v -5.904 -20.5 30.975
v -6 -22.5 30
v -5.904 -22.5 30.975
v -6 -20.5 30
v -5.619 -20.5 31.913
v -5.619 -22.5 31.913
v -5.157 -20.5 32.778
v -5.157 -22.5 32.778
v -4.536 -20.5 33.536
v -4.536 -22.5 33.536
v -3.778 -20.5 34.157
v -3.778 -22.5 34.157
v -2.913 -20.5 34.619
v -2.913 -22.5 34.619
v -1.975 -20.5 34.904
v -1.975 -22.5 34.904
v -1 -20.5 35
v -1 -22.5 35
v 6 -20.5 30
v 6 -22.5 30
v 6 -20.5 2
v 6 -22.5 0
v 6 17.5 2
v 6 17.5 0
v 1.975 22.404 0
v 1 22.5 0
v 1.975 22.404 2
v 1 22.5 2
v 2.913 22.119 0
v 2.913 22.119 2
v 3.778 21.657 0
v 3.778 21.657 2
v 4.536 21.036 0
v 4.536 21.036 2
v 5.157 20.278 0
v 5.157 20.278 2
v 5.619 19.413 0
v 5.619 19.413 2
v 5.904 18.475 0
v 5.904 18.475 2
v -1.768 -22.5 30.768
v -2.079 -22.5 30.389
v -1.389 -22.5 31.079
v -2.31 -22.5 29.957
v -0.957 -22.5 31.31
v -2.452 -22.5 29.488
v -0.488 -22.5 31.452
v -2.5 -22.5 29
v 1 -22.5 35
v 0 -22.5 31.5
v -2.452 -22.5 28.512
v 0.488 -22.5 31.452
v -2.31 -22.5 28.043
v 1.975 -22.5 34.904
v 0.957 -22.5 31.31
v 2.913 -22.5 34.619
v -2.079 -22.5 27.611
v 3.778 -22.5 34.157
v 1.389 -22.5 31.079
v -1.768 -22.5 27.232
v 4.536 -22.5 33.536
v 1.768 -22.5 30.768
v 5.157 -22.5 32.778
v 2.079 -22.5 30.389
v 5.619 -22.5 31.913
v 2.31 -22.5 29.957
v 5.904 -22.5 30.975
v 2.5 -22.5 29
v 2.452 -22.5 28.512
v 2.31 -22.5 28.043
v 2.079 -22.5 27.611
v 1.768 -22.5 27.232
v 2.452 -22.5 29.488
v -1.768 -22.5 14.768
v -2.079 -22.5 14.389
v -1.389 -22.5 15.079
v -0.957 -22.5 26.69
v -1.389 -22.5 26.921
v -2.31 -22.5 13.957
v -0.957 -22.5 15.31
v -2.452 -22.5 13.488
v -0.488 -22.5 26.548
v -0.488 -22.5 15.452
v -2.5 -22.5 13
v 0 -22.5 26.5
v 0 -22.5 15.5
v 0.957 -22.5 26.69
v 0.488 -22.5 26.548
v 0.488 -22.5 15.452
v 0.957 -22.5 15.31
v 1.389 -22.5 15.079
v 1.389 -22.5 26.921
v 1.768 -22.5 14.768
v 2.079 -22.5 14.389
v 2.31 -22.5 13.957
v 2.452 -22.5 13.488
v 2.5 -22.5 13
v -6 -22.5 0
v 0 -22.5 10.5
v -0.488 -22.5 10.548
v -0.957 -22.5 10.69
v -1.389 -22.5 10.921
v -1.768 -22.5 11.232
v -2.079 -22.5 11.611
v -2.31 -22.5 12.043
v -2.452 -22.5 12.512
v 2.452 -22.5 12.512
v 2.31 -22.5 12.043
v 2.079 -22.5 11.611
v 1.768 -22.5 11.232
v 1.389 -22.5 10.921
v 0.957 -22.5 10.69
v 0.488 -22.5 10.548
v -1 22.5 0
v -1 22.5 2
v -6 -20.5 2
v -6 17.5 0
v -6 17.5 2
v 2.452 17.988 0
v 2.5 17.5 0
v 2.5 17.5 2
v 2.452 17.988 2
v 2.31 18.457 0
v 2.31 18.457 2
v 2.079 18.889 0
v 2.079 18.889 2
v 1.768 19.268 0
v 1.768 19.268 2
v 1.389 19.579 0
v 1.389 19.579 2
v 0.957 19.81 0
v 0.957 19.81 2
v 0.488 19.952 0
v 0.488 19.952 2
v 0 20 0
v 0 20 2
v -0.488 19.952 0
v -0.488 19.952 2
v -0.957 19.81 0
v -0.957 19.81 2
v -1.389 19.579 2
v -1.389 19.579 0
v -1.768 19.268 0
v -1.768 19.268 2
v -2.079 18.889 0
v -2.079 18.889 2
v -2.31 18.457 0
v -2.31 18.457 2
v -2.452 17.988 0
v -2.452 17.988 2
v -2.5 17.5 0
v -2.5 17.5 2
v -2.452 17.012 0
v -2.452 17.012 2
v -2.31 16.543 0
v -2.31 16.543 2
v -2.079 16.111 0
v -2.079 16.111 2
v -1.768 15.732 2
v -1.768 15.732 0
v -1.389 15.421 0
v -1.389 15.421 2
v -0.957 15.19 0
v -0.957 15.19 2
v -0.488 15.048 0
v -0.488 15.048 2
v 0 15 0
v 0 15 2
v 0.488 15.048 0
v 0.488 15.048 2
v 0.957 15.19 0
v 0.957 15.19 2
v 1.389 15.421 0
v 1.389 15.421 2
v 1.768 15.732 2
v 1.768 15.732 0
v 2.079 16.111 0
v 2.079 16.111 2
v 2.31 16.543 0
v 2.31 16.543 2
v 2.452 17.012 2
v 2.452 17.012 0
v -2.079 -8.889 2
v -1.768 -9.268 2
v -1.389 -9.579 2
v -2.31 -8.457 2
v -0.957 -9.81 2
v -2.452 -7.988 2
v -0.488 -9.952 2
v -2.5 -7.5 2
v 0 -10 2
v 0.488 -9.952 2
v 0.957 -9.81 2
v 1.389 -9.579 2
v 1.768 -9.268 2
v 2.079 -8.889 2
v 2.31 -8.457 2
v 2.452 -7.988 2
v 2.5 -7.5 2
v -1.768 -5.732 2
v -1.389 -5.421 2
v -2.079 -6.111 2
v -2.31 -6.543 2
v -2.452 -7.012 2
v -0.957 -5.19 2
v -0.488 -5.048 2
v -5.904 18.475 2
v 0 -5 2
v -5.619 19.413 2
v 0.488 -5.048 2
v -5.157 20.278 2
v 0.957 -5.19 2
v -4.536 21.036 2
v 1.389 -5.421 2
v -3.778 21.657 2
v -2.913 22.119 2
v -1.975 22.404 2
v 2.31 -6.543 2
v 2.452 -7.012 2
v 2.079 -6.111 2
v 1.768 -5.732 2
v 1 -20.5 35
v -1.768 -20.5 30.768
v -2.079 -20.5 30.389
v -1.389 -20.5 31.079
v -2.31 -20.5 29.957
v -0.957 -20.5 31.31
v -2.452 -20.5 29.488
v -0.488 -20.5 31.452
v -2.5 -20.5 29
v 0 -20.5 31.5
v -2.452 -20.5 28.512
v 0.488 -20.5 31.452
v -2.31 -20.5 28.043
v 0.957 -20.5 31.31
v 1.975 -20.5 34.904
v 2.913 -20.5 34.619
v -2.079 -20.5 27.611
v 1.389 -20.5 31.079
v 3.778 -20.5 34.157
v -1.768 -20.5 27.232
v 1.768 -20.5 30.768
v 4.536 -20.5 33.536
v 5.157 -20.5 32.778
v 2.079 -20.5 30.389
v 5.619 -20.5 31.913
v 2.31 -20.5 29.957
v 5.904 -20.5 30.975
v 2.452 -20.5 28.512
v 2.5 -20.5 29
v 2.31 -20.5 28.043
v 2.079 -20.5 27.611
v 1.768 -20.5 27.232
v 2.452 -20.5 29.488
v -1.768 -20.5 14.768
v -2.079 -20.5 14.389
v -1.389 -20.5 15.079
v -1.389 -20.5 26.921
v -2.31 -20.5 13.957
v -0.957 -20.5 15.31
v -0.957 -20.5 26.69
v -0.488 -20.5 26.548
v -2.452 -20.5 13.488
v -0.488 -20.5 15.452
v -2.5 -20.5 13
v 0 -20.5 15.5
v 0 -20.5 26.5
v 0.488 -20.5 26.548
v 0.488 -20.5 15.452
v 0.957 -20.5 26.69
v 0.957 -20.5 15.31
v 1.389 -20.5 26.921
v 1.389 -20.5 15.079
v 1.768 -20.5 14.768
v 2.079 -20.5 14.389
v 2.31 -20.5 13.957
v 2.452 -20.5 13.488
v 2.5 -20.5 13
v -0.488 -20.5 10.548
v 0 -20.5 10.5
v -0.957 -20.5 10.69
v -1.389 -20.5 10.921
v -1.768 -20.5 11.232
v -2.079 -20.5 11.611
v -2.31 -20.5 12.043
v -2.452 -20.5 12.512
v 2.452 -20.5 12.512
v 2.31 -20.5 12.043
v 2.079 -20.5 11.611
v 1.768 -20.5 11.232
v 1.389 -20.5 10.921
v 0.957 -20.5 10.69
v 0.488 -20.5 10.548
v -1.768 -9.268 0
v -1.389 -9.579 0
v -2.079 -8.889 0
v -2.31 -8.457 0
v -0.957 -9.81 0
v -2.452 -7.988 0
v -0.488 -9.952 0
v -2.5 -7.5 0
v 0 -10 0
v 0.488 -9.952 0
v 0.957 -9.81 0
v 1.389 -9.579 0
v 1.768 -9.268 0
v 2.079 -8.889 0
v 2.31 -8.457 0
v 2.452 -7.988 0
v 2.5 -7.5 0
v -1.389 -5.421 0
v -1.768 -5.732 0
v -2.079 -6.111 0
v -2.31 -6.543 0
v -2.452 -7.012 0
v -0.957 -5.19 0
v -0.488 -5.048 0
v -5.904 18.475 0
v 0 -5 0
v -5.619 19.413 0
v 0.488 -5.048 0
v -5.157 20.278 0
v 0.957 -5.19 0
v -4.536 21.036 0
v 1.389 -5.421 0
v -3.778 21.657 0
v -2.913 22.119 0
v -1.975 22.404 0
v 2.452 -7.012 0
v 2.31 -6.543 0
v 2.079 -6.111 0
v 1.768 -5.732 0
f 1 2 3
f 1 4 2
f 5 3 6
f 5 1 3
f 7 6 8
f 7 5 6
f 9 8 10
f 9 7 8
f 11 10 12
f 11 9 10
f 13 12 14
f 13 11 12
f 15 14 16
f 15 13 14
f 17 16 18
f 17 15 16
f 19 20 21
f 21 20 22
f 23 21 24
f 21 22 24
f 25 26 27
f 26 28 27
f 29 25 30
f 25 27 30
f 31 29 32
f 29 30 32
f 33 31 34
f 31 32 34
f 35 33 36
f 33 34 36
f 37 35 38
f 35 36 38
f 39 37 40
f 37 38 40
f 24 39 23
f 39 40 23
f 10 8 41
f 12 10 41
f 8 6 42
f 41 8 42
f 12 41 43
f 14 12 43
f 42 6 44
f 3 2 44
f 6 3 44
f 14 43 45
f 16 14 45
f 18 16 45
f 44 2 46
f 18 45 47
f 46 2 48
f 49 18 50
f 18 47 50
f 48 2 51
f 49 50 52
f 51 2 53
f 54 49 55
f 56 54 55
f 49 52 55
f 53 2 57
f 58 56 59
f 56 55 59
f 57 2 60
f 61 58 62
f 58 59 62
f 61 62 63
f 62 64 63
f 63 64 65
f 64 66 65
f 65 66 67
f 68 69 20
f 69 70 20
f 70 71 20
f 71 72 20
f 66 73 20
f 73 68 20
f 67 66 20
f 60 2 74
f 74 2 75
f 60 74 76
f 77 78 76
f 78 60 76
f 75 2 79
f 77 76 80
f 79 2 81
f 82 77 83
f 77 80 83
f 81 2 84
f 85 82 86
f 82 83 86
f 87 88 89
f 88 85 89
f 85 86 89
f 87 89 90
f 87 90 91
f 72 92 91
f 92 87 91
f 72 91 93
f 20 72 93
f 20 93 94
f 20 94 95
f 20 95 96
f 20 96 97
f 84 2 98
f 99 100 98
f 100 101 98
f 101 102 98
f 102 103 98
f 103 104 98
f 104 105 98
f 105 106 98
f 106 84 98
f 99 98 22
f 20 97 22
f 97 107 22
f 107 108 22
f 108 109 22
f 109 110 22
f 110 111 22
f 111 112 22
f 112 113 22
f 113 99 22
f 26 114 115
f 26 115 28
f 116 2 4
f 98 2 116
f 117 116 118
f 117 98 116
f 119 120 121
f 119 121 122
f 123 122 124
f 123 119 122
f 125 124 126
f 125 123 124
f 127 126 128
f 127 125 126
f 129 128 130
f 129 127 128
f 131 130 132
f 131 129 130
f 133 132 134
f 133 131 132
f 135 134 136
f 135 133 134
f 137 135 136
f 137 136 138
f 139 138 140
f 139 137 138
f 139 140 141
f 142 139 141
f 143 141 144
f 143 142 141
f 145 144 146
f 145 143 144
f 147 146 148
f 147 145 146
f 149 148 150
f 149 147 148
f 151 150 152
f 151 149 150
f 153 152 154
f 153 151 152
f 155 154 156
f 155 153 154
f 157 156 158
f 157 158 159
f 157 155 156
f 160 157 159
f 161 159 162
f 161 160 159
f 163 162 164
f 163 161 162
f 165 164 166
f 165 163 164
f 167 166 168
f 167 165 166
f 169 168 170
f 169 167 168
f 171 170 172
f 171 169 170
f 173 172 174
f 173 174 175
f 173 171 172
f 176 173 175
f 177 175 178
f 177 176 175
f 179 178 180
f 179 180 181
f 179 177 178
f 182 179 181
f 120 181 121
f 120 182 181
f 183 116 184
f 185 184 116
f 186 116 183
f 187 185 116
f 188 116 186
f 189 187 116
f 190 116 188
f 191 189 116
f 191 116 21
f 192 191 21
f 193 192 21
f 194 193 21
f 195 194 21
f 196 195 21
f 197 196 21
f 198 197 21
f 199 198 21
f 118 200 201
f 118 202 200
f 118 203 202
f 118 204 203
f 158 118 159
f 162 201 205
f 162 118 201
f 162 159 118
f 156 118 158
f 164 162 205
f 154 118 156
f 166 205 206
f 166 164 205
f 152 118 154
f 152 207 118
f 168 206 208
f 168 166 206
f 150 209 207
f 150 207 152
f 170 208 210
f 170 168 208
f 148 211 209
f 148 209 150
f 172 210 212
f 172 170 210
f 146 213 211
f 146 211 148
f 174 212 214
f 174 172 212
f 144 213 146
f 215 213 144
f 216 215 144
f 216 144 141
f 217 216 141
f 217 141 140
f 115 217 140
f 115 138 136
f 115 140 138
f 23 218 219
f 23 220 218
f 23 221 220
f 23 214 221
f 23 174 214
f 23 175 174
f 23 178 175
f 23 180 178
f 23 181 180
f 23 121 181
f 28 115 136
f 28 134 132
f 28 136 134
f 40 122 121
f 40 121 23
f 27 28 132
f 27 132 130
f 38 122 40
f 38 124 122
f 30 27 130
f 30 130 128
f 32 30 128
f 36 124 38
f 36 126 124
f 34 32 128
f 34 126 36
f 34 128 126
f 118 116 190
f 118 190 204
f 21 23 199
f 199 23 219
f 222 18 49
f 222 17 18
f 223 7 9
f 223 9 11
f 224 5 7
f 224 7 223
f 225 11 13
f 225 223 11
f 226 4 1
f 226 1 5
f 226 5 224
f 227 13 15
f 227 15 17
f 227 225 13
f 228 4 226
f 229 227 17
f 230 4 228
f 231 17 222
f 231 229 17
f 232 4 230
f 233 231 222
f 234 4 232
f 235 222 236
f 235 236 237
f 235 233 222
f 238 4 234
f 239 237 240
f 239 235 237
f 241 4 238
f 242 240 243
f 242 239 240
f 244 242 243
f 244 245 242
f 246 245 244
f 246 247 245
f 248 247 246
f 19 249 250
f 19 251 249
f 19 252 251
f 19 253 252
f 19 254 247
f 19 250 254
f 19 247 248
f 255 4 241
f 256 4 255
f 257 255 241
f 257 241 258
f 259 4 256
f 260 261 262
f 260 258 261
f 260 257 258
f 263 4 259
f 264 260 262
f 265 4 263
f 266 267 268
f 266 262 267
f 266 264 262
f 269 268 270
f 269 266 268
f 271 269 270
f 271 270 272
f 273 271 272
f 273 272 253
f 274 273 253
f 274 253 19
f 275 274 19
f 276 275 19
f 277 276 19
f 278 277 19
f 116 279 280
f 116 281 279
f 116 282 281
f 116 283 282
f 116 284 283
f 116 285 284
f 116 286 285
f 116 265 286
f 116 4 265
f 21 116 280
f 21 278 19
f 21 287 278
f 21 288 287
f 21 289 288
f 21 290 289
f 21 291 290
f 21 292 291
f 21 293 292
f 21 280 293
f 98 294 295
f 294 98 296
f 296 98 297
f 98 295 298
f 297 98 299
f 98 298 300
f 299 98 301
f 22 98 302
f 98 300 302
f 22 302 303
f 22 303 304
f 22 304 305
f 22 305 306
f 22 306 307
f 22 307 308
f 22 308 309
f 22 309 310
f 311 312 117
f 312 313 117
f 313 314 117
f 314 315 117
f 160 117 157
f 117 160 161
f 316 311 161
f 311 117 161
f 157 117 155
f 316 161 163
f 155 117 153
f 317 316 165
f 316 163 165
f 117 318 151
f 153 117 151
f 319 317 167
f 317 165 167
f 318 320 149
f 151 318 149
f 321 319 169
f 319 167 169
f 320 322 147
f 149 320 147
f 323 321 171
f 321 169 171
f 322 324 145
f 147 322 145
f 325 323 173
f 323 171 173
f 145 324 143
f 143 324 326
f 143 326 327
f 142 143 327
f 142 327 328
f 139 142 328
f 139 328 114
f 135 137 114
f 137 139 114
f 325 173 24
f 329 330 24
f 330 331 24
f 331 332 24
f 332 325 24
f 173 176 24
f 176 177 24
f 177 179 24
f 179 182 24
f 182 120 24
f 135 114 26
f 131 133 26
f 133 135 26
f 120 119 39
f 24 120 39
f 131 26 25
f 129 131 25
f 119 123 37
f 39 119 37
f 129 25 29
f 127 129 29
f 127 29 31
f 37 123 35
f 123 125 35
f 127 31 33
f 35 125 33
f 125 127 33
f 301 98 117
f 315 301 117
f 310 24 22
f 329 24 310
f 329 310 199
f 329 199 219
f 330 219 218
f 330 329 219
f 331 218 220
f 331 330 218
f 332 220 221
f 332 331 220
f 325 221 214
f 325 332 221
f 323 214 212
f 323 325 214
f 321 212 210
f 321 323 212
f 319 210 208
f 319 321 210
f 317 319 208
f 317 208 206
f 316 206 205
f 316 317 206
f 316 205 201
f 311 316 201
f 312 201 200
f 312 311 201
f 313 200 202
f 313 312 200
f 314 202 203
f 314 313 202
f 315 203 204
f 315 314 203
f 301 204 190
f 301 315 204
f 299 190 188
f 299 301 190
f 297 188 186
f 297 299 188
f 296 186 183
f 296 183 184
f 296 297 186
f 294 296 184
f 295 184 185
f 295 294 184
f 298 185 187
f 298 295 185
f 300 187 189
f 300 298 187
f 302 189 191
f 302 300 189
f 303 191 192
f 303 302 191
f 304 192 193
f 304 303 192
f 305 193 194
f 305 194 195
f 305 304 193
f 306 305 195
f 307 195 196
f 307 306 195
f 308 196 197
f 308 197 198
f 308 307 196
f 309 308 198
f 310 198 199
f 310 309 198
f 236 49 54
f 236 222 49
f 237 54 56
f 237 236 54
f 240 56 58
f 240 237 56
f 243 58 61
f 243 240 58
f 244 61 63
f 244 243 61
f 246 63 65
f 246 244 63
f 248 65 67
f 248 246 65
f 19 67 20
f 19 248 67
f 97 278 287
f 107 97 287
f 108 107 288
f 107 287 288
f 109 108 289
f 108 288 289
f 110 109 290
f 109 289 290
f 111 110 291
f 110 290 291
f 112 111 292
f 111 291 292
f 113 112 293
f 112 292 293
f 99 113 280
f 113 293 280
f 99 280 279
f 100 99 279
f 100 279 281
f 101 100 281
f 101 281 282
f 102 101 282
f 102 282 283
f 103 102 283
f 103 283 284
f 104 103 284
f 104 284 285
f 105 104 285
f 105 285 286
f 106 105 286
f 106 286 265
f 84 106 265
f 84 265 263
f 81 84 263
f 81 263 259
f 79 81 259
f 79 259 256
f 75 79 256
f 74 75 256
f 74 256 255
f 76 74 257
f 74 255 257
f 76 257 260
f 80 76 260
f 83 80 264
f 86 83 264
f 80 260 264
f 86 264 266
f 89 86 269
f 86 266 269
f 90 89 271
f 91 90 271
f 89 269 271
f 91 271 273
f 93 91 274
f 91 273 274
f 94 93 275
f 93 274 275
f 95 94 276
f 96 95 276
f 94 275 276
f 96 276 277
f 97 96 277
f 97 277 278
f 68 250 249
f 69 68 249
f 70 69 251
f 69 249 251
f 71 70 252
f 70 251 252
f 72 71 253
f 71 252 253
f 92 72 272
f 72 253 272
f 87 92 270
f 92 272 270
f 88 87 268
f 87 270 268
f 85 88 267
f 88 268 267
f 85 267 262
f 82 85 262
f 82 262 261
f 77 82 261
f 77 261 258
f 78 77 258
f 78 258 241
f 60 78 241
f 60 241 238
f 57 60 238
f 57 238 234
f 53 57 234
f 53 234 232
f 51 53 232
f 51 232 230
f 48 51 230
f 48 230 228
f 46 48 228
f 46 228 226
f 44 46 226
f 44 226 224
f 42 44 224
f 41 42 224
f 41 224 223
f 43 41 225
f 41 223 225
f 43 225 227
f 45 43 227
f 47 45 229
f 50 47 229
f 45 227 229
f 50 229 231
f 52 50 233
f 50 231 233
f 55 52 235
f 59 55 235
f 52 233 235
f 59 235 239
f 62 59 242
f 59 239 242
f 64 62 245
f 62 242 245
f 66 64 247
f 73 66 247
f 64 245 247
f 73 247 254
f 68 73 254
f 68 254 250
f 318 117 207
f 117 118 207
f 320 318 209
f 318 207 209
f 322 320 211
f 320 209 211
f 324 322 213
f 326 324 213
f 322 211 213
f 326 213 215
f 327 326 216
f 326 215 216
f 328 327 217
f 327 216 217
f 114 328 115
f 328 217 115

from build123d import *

# Parameters (mm, degrees)
SKETCH1_W           = 12
SKETCH1_H           = 45
SKETCH1_R           = 2.5
BOSS_EXTRUDE1_DEPTH = 2
FILLET3_R           = 5
SKETCH2_W           = 12
SKETCH2_H           = 2
BOSS_EXTRUDE2_DEPTH = 33
SKETCH3_R           = 2.5
CUT_EXTRUDE1_DEPTH  = 33
FILLET4_R           = 5


with BuildPart() as part:
    # Sketch1 → Boss-Extrude1 (new body)
    with BuildSketch(Plane.XY):
        Rectangle(SKETCH1_W, SKETCH1_H)
        with Locations((0, -7.5)):
            Circle(SKETCH1_R, mode=Mode.SUBTRACT)
        with Locations((0, 17.5)):
            Circle(SKETCH1_R, mode=Mode.SUBTRACT)
    extrude(amount=BOSS_EXTRUDE1_DEPTH)

    # Fillet3
    fillet3_edges = [part.edges().sort_by_distance(p)[0] for p in [
        (-6, 22.5, 1),
        (6, 22.5, 1),
    ]]
    fillet(fillet3_edges, radius=FILLET3_R)

    # Sketch2 → Boss-Extrude2 (add)
    with BuildSketch(Plane.XY.offset(2)):
        with Locations((0, -21.5)):
            Rectangle(SKETCH2_W, SKETCH2_H)
    extrude(amount=BOSS_EXTRUDE2_DEPTH)

    # Sketch3 → Cut-Extrude1 (cut)
    with BuildSketch(Plane(origin=(0, -20.5, 0), x_dir=(1, 0, 0), z_dir=(0, 1, 0))):
        with Locations((0, -13)):
            Circle(SKETCH3_R)
        with Locations((0, -29)):
            Circle(SKETCH3_R)
    extrude(amount=-CUT_EXTRUDE1_DEPTH, mode=Mode.SUBTRACT)

    # Fillet4
    fillet4_edges = [part.edges().sort_by_distance(p)[0] for p in [
        (-6, -21.5, 35),
        (6, -21.5, 35),
    ]]
    fillet(fillet4_edges, radius=FILLET4_R)


solid = part.part
